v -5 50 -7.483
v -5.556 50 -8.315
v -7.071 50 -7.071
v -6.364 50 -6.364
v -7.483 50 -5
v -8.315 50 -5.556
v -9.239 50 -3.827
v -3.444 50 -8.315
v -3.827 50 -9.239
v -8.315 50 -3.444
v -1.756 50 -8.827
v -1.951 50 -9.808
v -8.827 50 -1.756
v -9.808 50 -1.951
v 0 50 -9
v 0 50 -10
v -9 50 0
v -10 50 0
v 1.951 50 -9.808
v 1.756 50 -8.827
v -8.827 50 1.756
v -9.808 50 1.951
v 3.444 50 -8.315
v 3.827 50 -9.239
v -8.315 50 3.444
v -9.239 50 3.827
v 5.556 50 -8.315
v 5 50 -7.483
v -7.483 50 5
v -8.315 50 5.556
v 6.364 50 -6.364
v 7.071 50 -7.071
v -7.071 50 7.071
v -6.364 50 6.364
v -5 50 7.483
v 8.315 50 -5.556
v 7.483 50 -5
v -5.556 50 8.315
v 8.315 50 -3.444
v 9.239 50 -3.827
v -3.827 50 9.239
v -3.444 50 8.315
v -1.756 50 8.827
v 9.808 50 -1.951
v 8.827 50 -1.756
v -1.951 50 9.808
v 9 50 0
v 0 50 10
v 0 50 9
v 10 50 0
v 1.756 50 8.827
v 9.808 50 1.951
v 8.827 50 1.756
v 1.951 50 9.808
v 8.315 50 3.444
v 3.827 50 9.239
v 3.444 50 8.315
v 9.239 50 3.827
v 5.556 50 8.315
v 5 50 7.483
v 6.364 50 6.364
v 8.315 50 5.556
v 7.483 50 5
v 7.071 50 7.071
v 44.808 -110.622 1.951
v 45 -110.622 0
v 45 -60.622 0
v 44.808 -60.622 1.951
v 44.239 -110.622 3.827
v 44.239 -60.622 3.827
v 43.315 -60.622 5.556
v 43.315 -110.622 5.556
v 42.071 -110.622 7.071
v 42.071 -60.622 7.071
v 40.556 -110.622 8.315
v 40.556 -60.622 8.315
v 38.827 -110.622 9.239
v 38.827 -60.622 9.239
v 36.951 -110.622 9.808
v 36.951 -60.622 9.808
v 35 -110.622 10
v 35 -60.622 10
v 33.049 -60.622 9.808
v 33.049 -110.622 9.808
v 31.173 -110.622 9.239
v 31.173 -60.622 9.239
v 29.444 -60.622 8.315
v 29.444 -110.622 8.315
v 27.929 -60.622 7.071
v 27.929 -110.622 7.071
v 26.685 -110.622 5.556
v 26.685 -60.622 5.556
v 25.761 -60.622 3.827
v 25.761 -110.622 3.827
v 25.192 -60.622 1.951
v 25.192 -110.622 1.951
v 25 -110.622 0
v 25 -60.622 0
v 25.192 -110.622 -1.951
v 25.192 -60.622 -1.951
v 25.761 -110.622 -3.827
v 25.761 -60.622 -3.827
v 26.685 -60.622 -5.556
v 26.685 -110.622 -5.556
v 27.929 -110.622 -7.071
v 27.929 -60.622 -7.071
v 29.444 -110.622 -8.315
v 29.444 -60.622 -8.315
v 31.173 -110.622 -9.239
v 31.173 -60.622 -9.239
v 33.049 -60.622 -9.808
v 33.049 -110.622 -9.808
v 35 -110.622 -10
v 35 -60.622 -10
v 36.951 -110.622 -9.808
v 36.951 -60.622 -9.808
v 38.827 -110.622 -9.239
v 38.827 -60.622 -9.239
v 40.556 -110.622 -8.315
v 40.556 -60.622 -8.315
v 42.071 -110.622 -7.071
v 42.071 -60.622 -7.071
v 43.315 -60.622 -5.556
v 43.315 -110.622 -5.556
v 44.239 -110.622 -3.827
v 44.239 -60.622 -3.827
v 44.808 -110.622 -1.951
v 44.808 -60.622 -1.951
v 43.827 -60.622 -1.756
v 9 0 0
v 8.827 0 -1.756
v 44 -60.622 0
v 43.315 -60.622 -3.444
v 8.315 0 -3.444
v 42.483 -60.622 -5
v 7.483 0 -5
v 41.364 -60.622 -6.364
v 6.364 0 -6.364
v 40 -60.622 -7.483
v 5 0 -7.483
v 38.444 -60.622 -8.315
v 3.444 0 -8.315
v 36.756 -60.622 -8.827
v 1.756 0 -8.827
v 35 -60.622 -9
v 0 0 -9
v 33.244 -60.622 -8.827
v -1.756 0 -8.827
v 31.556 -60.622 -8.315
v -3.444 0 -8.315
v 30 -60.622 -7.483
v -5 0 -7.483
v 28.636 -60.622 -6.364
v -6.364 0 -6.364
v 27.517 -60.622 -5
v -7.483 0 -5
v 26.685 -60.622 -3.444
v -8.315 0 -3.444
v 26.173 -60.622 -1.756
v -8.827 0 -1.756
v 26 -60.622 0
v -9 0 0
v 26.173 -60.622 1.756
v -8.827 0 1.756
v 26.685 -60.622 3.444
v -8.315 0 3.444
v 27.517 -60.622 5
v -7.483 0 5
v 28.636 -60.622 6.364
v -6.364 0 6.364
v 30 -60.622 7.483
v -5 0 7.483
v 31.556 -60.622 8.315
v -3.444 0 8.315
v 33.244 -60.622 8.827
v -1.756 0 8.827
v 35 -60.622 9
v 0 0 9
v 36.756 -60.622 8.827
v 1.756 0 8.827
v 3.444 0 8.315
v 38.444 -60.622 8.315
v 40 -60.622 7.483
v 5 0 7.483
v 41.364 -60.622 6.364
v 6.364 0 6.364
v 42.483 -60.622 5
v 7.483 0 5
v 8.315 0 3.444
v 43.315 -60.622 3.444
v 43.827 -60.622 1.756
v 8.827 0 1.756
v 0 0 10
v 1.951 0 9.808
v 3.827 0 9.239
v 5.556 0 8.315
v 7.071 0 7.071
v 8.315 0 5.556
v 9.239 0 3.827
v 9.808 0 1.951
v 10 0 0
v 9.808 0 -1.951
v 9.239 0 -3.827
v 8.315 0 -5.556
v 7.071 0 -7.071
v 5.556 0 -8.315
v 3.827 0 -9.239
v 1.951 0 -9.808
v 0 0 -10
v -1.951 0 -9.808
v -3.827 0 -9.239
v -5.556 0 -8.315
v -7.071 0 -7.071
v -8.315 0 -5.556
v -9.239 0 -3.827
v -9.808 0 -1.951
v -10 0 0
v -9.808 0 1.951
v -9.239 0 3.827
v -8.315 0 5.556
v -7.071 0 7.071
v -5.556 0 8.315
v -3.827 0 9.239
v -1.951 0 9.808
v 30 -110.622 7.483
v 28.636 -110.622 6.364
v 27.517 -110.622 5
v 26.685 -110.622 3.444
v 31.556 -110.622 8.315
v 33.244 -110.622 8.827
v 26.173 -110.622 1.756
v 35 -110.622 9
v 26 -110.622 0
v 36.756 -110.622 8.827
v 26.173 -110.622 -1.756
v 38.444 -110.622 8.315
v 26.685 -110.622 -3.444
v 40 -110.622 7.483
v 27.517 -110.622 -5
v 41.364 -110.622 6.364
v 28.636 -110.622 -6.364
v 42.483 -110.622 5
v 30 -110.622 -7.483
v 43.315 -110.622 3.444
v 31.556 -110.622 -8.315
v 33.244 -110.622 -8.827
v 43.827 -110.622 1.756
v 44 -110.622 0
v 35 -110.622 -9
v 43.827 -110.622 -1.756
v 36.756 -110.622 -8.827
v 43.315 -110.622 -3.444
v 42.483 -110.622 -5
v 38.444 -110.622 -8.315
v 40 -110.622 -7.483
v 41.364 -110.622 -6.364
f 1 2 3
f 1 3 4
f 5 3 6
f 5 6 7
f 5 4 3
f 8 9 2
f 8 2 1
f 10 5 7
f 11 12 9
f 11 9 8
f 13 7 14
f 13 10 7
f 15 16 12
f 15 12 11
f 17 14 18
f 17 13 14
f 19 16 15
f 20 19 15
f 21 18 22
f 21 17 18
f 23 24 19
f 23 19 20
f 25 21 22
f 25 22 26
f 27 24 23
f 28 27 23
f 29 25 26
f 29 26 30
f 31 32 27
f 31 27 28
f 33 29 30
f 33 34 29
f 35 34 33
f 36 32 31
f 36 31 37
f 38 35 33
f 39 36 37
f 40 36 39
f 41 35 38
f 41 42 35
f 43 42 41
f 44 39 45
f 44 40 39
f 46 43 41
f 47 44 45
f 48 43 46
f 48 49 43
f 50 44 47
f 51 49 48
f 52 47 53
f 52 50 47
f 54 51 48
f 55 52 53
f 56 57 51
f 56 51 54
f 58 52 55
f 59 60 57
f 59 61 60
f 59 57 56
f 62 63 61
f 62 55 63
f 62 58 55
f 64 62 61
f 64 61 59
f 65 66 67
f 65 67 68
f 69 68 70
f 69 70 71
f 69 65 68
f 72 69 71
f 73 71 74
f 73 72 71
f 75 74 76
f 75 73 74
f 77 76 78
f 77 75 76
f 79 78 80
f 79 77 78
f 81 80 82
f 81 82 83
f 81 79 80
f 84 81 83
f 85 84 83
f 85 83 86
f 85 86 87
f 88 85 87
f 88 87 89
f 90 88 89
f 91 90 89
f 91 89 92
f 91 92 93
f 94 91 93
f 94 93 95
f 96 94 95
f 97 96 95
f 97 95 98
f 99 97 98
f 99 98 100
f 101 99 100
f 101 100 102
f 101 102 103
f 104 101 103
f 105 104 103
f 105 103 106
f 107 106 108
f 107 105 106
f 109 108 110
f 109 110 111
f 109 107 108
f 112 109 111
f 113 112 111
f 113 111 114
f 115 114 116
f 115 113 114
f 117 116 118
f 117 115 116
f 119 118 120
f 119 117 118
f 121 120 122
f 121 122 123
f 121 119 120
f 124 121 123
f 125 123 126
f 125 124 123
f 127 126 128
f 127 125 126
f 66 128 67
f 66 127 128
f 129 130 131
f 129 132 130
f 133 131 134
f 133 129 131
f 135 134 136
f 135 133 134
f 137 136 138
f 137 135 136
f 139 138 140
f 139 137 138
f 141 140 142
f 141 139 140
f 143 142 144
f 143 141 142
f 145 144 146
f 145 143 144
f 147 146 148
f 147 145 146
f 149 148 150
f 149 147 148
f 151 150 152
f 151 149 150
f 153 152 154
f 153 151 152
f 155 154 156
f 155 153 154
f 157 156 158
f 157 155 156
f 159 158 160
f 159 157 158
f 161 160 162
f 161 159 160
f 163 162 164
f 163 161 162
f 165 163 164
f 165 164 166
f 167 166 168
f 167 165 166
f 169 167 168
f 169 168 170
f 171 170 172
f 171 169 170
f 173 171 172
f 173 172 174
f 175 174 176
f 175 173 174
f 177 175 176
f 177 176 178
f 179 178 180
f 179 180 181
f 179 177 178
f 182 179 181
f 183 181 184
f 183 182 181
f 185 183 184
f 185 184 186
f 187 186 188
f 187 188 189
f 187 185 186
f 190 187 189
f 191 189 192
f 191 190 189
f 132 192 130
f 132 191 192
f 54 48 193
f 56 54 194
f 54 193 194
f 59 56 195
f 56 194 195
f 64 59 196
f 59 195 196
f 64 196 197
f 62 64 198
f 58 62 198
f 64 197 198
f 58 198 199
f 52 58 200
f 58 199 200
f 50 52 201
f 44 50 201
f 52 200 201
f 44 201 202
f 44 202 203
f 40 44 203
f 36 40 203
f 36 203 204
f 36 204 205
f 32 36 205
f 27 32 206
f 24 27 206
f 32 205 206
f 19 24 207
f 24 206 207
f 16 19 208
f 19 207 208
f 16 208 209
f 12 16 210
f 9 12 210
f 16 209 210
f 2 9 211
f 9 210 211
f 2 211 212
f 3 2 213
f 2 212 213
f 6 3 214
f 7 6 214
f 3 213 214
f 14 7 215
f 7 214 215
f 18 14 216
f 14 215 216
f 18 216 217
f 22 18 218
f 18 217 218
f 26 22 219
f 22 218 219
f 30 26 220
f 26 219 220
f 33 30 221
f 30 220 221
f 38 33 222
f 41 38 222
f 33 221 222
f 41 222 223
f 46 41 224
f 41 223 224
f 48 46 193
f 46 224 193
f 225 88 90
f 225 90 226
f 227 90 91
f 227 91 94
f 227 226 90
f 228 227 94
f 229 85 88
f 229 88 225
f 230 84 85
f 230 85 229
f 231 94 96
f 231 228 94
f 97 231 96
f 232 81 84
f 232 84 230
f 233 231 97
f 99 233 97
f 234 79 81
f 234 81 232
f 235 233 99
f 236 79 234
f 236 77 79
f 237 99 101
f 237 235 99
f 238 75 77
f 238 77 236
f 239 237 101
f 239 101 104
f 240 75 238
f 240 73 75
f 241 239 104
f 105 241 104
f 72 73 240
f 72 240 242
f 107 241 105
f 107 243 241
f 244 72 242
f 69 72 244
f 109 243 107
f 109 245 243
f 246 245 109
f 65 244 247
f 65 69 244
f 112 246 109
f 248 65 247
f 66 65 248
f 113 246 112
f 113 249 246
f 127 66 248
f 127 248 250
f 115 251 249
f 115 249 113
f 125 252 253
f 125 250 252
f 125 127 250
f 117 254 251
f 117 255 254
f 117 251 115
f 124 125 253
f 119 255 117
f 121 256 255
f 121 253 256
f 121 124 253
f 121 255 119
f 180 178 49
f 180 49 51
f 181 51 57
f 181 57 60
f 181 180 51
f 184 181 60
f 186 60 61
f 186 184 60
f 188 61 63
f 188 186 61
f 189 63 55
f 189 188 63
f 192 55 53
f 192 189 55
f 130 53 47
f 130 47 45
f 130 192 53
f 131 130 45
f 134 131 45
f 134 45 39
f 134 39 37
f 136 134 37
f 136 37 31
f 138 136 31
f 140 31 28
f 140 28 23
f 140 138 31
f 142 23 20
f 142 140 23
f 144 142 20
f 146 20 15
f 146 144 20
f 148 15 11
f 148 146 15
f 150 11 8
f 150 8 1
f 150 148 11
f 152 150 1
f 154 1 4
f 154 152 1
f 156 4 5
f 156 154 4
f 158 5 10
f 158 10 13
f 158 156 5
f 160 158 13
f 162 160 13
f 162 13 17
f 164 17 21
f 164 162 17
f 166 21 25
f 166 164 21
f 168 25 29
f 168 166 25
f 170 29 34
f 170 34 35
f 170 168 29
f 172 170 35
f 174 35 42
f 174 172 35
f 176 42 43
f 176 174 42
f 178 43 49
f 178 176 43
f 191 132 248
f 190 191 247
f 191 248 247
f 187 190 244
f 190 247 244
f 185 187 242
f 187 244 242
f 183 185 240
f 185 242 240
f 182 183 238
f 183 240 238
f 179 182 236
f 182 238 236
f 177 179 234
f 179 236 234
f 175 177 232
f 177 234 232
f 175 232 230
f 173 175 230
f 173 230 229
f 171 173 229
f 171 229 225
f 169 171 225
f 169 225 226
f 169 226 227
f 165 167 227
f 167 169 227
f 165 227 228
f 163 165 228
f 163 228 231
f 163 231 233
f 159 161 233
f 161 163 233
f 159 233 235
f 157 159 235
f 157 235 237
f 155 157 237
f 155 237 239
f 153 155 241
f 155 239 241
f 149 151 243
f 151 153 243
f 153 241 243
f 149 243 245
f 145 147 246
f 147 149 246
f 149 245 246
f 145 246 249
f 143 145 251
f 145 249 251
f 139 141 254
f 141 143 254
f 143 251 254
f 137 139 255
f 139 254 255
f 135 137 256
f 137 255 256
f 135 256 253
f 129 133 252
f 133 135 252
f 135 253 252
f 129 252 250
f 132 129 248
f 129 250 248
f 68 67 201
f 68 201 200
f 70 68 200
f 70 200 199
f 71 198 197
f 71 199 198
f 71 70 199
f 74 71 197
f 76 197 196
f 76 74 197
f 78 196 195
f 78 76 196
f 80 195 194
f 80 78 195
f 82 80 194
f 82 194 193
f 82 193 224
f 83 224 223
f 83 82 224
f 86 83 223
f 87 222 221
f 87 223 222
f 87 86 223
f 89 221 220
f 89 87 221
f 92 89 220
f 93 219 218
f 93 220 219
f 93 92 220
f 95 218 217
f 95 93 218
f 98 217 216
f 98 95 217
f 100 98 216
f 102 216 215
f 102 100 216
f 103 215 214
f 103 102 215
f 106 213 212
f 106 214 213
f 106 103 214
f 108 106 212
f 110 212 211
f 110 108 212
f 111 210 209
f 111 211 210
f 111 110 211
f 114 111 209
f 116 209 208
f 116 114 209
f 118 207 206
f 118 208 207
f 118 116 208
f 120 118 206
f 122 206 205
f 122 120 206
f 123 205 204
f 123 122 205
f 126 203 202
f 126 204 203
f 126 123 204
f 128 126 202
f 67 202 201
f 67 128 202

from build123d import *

# Parameters (mm, degrees)
SKETCH1_R           = 10
SKETCH1_R_2         = 9
BOSS_EXTRUDE1_DEPTH = 50
SKETCH2_R           = 10
SKETCH2_R_2         = 9
SKETCH4_R           = 10
SKETCH4_R_2         = 9


with BuildPart() as part:
    # Sketch1 → Boss-Extrude1 (new body)
    with BuildSketch(Plane(origin=(0, 0, 0), x_dir=(1, 0, 0), z_dir=(0, 1, 0))):
        with Locations(Location((0, 0, 0), (0, 0, 270))):
            Circle(SKETCH1_R)
        with Locations(Location((0, 0, 0), (0, 0, 270))):
            Circle(SKETCH1_R_2, mode=Mode.SUBTRACT)
    extrude(amount=BOSS_EXTRUDE1_DEPTH)

    # Sweep1: sweep along a path in Sketch3
    with BuildLine(Plane.XY) as sweep1_path:
        Line((0, 0), (35, -60.621778265))
    # Sketch2 → Sweep1 (sweep)
    with BuildSketch(Plane.XZ):
        Circle(SKETCH2_R)
        Circle(SKETCH2_R_2, mode=Mode.SUBTRACT)
    sweep(path=sweep1_path.line)

    # Sweep2: sweep along a path in Sketch5
    with BuildLine(Plane.XY) as sweep2_path:
        Line((35, -60.621778265), (35, -110.621778265))
    # Sketch4 → Sweep2 (sweep)
    with BuildSketch(Plane.XZ.offset(60.621778265)):
        with Locations((35, 0)):
            Circle(SKETCH4_R)
        with Locations((35, 0)):
            Circle(SKETCH4_R_2, mode=Mode.SUBTRACT)
    sweep(path=sweep2_path.line)


solid = part.part
